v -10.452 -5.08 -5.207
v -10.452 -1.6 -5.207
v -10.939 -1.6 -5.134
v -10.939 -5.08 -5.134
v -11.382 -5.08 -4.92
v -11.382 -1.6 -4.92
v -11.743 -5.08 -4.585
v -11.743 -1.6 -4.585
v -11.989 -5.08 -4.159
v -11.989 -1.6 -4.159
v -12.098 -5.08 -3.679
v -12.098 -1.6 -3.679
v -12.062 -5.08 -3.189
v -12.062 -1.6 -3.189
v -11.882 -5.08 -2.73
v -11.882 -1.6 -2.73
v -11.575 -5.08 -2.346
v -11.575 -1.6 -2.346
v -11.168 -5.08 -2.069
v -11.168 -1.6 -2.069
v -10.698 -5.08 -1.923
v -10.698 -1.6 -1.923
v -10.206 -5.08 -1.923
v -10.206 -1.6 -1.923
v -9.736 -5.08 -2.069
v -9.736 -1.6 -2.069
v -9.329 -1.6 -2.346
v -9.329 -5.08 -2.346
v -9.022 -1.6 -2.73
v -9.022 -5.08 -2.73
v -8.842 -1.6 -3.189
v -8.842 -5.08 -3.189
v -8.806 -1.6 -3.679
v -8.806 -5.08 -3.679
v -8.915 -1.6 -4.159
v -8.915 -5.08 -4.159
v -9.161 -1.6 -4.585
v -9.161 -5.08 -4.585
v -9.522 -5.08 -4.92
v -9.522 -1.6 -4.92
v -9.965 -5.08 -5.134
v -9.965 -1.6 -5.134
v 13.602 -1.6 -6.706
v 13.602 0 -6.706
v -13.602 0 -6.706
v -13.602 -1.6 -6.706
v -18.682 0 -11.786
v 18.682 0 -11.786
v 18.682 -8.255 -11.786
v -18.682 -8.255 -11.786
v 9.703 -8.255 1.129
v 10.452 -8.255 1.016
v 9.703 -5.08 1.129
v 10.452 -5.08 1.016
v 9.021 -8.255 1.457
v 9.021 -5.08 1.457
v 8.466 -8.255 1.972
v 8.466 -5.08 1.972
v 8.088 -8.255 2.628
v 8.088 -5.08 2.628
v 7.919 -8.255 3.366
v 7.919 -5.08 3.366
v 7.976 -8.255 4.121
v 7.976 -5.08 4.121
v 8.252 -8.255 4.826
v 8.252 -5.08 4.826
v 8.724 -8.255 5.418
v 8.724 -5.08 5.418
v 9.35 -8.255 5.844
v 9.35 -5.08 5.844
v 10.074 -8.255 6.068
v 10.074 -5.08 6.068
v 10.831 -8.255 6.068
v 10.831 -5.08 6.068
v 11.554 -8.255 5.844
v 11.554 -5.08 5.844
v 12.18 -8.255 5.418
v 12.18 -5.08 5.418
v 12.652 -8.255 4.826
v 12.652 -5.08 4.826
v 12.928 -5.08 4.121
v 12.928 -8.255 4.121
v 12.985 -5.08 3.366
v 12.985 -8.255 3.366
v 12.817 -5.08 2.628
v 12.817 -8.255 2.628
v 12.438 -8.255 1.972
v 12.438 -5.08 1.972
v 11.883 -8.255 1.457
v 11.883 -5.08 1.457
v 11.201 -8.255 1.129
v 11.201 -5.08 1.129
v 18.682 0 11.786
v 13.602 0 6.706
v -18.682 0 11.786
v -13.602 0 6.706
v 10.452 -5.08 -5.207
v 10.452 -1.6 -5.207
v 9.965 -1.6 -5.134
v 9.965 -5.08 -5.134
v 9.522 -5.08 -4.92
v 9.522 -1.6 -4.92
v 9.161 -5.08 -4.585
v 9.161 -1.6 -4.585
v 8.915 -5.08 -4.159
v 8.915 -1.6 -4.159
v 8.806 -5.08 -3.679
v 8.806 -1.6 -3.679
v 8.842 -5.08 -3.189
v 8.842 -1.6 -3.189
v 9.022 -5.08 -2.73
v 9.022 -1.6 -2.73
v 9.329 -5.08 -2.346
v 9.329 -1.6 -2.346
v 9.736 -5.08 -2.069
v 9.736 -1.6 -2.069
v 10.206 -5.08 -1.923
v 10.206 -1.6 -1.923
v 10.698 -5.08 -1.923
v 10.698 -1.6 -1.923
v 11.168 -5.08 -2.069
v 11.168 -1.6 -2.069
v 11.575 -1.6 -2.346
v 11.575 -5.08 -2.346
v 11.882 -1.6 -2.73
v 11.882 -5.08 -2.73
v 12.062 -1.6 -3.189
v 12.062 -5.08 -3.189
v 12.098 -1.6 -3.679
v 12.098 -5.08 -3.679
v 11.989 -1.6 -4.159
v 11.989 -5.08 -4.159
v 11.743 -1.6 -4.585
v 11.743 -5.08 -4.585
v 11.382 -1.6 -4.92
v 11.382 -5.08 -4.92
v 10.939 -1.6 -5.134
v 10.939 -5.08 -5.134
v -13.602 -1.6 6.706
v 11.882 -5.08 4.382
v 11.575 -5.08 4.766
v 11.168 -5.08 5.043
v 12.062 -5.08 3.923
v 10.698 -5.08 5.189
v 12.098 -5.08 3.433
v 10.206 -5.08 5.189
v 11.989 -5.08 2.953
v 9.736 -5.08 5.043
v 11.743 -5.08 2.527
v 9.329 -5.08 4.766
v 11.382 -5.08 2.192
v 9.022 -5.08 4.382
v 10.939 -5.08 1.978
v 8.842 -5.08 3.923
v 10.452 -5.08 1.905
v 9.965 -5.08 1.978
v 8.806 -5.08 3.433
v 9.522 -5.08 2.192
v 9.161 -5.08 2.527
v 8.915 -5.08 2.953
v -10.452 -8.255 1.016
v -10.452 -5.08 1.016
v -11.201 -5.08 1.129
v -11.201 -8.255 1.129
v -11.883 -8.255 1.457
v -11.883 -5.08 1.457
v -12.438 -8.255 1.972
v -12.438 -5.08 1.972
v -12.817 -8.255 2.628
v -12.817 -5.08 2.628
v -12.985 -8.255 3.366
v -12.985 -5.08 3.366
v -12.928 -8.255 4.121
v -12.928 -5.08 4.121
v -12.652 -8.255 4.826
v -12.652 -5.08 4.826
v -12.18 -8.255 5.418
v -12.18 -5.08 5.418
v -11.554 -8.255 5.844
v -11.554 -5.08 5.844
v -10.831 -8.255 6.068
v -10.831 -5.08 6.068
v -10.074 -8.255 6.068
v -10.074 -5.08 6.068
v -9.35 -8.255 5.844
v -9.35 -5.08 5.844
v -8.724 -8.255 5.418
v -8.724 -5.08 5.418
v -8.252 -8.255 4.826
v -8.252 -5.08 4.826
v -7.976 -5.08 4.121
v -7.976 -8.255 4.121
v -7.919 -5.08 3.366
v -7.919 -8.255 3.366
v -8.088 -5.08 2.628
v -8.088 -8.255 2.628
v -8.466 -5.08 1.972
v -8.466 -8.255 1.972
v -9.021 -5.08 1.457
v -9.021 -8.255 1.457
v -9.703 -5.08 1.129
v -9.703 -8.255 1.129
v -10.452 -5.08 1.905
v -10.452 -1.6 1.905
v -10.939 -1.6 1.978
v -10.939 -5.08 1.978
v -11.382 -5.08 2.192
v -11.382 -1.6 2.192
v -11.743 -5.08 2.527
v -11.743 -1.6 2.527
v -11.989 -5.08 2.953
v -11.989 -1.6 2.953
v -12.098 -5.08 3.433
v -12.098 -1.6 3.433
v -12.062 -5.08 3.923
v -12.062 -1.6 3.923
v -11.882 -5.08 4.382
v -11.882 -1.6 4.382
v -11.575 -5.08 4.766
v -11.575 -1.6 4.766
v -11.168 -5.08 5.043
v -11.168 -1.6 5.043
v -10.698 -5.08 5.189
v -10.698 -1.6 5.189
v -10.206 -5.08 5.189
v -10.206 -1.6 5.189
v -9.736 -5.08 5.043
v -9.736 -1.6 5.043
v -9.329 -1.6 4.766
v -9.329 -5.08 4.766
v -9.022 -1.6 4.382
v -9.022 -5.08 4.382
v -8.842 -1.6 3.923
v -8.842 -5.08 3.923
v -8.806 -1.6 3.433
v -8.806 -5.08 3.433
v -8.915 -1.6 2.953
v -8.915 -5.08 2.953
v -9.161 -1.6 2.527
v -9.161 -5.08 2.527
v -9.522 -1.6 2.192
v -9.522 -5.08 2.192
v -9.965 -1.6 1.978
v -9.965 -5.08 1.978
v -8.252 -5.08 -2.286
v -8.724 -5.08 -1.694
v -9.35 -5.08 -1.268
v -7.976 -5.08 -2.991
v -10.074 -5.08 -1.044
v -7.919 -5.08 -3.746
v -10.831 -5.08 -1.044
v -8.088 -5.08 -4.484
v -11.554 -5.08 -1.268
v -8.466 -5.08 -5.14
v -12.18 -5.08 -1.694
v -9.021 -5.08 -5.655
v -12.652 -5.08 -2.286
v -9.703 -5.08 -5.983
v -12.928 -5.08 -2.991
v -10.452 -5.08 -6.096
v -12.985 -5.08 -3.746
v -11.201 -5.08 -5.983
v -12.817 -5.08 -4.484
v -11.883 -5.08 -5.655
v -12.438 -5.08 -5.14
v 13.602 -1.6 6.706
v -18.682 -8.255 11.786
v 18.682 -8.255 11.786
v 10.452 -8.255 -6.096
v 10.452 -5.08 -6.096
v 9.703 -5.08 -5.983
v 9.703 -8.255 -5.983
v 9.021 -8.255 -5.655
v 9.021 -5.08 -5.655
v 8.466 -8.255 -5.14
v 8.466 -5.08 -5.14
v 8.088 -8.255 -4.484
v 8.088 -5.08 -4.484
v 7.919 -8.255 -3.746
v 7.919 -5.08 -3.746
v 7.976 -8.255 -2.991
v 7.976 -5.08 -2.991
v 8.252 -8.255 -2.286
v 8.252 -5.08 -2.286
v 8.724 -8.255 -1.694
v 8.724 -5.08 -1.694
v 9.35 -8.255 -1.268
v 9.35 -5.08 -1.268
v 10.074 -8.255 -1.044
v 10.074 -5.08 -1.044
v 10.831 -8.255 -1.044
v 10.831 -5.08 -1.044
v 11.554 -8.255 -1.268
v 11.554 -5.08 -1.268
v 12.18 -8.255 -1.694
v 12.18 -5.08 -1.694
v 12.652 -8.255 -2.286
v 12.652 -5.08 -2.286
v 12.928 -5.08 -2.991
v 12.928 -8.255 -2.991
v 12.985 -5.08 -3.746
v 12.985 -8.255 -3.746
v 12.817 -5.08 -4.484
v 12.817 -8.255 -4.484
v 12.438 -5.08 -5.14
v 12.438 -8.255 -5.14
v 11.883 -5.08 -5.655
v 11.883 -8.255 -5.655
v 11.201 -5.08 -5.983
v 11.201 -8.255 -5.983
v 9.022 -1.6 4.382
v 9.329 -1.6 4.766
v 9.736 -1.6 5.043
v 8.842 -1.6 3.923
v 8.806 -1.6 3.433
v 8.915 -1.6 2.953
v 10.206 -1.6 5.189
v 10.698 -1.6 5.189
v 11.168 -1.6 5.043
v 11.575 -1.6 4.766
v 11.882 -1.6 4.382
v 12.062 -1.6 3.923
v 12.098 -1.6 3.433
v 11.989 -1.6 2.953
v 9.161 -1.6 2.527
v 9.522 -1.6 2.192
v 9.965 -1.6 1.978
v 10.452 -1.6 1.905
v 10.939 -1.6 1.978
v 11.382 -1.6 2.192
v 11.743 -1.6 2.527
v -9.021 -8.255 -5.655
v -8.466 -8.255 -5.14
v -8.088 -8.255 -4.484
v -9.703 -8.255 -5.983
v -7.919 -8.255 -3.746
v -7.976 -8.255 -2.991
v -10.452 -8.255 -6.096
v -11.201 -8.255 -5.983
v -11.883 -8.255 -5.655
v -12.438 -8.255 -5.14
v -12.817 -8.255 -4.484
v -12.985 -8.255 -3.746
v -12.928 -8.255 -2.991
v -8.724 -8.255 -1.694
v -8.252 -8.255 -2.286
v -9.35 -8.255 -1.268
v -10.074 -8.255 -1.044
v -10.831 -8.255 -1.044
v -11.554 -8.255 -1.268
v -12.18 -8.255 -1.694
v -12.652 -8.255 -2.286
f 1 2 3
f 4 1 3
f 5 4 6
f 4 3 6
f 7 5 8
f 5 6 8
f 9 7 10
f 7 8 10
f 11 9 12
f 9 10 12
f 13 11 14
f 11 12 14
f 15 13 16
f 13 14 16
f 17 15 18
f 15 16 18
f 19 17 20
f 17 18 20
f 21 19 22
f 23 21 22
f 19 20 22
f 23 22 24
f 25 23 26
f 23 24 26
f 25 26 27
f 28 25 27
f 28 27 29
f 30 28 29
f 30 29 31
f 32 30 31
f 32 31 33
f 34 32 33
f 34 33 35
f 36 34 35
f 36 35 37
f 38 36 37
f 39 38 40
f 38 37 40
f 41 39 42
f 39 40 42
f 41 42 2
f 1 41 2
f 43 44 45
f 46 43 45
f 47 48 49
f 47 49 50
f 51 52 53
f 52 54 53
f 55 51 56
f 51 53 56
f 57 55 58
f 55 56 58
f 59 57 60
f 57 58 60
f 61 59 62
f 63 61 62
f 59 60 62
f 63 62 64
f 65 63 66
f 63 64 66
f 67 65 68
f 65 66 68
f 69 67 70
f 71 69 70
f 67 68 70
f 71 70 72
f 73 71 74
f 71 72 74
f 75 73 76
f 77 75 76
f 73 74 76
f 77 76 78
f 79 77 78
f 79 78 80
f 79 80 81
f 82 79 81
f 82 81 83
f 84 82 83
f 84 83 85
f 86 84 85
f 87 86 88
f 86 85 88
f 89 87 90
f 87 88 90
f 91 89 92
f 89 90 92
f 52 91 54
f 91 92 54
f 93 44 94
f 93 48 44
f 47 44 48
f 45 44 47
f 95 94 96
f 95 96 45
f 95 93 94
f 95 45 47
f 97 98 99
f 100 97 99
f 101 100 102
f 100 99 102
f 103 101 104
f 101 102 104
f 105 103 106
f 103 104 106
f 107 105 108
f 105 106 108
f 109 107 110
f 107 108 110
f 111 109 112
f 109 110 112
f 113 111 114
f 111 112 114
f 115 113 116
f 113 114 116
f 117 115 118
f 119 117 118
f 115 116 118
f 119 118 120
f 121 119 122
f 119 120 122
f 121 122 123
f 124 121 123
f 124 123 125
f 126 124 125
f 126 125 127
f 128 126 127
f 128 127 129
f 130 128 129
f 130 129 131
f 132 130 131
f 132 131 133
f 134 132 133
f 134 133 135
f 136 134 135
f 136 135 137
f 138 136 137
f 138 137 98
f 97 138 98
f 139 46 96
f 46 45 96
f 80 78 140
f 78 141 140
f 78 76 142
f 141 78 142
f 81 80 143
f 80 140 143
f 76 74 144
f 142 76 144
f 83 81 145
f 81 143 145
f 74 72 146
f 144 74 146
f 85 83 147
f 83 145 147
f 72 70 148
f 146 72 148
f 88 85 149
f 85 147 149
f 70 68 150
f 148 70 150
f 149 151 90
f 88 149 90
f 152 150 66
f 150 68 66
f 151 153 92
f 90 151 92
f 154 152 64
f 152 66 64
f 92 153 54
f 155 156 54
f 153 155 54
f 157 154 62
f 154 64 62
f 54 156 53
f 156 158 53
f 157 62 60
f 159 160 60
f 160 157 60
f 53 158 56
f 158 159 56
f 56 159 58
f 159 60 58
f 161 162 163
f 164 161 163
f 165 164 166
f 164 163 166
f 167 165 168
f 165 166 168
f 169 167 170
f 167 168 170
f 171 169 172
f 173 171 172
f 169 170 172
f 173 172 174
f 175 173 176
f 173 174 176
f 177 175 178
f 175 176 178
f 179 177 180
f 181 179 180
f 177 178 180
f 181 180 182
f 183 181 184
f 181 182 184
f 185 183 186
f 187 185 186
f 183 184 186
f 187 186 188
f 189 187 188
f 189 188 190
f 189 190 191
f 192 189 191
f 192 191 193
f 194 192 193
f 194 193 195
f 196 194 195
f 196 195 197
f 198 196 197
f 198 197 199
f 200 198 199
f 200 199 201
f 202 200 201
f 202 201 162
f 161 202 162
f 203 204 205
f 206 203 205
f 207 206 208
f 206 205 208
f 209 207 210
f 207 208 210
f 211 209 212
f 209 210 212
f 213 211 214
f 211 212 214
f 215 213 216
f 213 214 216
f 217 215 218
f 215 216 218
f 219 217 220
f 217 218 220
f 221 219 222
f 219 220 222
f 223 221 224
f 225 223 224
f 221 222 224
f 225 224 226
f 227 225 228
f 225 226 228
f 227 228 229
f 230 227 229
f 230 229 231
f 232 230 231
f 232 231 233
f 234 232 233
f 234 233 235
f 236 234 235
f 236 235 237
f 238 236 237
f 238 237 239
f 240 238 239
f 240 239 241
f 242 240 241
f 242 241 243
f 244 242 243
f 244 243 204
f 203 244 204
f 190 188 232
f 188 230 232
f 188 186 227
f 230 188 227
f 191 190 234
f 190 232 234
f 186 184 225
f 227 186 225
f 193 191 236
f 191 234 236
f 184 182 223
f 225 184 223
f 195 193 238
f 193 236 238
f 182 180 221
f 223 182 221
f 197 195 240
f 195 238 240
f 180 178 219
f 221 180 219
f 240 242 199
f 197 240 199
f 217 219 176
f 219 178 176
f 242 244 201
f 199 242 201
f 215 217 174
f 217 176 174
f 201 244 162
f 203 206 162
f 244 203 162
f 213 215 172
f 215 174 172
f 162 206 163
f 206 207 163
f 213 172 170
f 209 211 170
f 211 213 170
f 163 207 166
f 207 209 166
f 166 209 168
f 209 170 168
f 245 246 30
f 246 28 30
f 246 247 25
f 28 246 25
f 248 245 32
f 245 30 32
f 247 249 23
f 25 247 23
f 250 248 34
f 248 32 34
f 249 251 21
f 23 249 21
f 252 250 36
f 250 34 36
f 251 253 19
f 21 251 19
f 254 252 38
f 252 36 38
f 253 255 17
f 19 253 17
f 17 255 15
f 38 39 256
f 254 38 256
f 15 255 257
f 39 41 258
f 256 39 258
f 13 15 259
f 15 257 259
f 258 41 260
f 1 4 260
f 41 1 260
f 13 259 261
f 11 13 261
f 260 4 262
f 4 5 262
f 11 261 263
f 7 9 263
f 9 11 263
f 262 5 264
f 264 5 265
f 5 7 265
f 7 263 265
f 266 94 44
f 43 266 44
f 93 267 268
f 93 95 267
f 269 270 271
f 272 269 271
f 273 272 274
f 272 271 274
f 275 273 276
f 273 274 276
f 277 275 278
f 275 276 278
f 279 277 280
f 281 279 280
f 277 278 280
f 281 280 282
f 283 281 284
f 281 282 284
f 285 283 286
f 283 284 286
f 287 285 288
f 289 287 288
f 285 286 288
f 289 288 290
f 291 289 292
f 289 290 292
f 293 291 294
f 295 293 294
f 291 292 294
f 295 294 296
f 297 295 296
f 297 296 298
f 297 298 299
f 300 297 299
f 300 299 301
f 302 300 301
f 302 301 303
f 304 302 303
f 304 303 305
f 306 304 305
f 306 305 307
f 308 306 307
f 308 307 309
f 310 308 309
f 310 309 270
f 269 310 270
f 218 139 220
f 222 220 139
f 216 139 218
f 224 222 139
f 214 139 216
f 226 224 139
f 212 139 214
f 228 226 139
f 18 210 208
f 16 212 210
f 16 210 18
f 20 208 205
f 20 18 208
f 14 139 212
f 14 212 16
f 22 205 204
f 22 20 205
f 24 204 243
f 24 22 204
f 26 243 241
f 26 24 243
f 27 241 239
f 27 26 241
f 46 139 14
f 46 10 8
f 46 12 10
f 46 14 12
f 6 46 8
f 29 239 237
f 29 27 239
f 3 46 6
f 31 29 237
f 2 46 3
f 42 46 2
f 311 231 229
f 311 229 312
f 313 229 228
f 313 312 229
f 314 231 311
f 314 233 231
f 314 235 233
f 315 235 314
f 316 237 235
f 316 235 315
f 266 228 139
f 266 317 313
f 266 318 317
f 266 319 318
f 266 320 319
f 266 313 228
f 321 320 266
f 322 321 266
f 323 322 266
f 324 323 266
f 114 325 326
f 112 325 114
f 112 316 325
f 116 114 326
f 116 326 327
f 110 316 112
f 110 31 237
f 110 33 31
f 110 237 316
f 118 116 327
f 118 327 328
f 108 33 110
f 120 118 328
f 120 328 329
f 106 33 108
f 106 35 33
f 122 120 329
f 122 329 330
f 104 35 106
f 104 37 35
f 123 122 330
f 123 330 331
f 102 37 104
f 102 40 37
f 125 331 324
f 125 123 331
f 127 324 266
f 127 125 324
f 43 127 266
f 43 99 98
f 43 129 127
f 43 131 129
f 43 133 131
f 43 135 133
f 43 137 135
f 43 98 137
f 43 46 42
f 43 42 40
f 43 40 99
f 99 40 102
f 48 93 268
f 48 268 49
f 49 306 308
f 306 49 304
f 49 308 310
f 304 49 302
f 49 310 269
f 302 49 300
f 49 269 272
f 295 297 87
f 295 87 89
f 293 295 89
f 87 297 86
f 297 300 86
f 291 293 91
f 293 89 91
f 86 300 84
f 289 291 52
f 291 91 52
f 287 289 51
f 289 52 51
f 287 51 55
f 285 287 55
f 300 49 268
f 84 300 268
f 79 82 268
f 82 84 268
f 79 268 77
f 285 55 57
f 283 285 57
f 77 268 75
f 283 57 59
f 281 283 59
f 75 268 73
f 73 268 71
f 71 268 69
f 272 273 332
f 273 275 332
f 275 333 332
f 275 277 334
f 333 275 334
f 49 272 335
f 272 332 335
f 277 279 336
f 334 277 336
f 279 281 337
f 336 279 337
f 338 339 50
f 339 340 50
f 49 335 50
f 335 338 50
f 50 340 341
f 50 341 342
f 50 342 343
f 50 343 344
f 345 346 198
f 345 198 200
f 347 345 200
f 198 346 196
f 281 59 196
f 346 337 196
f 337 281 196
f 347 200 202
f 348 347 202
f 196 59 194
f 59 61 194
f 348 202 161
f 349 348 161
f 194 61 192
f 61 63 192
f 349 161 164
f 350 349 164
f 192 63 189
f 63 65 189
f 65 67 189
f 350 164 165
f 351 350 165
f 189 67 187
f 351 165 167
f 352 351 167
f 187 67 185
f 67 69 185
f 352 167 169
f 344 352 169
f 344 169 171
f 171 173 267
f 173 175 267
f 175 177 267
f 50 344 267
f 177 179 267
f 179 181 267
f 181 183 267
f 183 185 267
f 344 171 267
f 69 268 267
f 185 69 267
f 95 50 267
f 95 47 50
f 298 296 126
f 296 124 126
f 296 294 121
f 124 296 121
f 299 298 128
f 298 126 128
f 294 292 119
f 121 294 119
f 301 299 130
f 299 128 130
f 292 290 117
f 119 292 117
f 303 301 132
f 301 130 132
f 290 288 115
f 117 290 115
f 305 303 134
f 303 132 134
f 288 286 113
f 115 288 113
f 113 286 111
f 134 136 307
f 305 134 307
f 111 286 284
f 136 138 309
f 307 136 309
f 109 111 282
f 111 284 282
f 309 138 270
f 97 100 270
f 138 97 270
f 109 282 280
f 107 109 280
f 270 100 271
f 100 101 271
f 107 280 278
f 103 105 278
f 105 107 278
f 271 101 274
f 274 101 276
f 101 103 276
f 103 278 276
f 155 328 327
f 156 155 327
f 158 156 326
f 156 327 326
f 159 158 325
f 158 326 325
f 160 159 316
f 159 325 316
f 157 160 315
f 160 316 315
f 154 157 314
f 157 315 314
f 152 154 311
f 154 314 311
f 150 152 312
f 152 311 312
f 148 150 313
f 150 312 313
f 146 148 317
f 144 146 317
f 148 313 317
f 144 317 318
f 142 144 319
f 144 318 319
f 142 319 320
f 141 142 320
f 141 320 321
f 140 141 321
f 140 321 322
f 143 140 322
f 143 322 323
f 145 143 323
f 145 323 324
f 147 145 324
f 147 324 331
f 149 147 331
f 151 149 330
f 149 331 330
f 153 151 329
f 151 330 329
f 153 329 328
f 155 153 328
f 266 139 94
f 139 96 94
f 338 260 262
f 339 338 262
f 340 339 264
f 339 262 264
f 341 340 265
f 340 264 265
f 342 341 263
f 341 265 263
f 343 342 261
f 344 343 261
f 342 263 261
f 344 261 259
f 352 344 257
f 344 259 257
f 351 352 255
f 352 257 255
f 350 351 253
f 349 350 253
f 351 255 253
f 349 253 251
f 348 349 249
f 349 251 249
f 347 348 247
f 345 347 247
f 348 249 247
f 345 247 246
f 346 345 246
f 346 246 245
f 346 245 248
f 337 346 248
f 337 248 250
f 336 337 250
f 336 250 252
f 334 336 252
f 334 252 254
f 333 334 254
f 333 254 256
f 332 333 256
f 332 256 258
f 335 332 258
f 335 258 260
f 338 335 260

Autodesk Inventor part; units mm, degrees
ref_plane "YZ Plane" through (0, 0, 0) normal (1, 0, 0) x (0, 1, 0)
ref_plane "XZ Plane" through (0, 0, 0) normal (0, 1, 0) x (-1, 0, 0)
ref_plane "XY Plane" through (0, 0, 0) normal (0, 0, 1) x (1, 0, 0)
sketch "Sketch1" plane through (0, 0, 0) normal (0, 1, 0) x (-1, 0, 0)
  line L0 (18.6817, 11.7856) -> (-18.6817, 11.7856)
  line L1 (-18.6817, 11.7856) -> (-18.6817, -11.7856)
  line L2 (-18.6817, -11.7856) -> (18.6817, -11.7856)
  line L3 (18.6817, -11.7856) -> (18.6817, 11.7856)
  line L4 (18.6817, 11.7856) -> (-18.6817, -11.7856) construction
  line L5 (-18.6817, 11.7856) -> (18.6817, -11.7856) construction
  point P0 (0, 0)
  dimension "d0" = 37.3634
  dimension "d1" = 23.5712
extrude "Extrusion1" add sketch "Sketch1" against normal blind 8.255
sketch "Sketch2" plane through (0, 0, 0) normal (0, 1, 0) x (1, 0, 0)
  line L0 (-13.6017, -6.7056) -> (13.6017, -6.7056)
  line L1 (13.6017, -6.7056) -> (13.6017, 6.7056)
  line L2 (13.6017, 6.7056) -> (-13.6017, 6.7056)
  line L3 (-13.6017, 6.7056) -> (-13.6017, -6.7056)
  line L4 (-13.6017, -6.7056) -> (13.6017, 6.7056) construction
  line L5 (13.6017, -6.7056) -> (-13.6017, 6.7056) construction
  point P0 (0, 0)
  dimension "d4" = 13.4112
  dimension "d5" = 27.2034
extrude "Extrusion2" cut sketch "Sketch2" against normal blind 1.6002
sketch "Sketch3" plane through (0, -8.255, 0) normal (0, -1, 0) x (1, 0, 0)
  line L0 (10.4521, 3.556) -> (-10.4521, 3.556) construction
  line L1 (-10.4521, 3.556) -> (-10.4521, -3.556) construction
  line L2 (-10.4521, -3.556) -> (10.4521, -3.556) construction
  line L3 (10.4521, -3.556) -> (10.4521, 3.556) construction
  line L4 (10.4521, 3.556) -> (-10.4521, -3.556) construction
  line L5 (-10.4521, 3.556) -> (10.4521, -3.556) construction
  point P0 (0, 0)
  dimension "d8" = 7.112
  dimension "d9" = 20.9042
hole "Hole2" at (10.4521, -8.255, -3.556) at (-10.4521, -8.255, -3.556) at (-10.4521, -8.255, 3.556) at (10.4521, -8.255, 3.556) direction (0, 1, 0) diameter 5.08 depth 3.175
sketch "Sketch14" plane through (10.4521, -5.08, -3.556) normal (0, -1, 0) x (1, 0, 0)
  circle A0 centre (0, 0) radius 2.54 projected
  circle A1 centre (0, 7.112) radius 2.54 projected
  circle A2 centre (-20.9042, 7.112) radius 2.54 projected
  point P0 (-10.4521, 3.556)
  point P1 (-20.9042, 0)
hole "Hole10" at (10.4521, -5.08, -3.556) at (10.4521, -5.08, 3.556) at (-10.4521, -5.08, 3.556) at (-10.4521, -5.08, -3.556) direction (0, 1, 0) diameter 3.302 end through all
sketch "Sketch9" plane through (-10.4521, -5.08, -3.556) normal (0, -1, 0) x (1, 0, 0)
  point P0 (0, 0)
equation "\"d0\" = PartWidth"
equation "\"d1\" = PartLength"
equation "\"d2\" = BaseHeight"
equation "\"d4\" = CanBaseLength"
equation "\"d5\" = CanBaseWidth"
equation "\"d8\" = HoleLength"
equation "\"d9\" = HoleWidth"
equation "\"d18\" = boltHeadDiam"
equation "\"d23\" = boltHeadHeight"
equation "\"d74\" = boltDiamHole"
equation "\"HoleWidth\" = 20.9042"
equation "\"HoleLength\" = 7.112"
equation "\"BaseOffset\" = 5.08"
equation "\"PartWidth\" = CanBaseWidth + 2 * BaseOffset"
equation "\"PartLength\" = CanBaseLength + 2 * BaseOffset"
equation "\"boardGap\" = 0.508"
equation "\"boltHeadHeight\" = 3.175"
equation "\"boltHeadDiam\" = 5.08"
equation "\"boltDiamHole\" = 3.302"
equation "\"BaseHeight\" = 8.255"
equation "\"CanBaseLength\" = 13.4112"
equation "\"CanBaseWidth\" = 27.2034"
properties part number "BaseForCanBusConnector"
